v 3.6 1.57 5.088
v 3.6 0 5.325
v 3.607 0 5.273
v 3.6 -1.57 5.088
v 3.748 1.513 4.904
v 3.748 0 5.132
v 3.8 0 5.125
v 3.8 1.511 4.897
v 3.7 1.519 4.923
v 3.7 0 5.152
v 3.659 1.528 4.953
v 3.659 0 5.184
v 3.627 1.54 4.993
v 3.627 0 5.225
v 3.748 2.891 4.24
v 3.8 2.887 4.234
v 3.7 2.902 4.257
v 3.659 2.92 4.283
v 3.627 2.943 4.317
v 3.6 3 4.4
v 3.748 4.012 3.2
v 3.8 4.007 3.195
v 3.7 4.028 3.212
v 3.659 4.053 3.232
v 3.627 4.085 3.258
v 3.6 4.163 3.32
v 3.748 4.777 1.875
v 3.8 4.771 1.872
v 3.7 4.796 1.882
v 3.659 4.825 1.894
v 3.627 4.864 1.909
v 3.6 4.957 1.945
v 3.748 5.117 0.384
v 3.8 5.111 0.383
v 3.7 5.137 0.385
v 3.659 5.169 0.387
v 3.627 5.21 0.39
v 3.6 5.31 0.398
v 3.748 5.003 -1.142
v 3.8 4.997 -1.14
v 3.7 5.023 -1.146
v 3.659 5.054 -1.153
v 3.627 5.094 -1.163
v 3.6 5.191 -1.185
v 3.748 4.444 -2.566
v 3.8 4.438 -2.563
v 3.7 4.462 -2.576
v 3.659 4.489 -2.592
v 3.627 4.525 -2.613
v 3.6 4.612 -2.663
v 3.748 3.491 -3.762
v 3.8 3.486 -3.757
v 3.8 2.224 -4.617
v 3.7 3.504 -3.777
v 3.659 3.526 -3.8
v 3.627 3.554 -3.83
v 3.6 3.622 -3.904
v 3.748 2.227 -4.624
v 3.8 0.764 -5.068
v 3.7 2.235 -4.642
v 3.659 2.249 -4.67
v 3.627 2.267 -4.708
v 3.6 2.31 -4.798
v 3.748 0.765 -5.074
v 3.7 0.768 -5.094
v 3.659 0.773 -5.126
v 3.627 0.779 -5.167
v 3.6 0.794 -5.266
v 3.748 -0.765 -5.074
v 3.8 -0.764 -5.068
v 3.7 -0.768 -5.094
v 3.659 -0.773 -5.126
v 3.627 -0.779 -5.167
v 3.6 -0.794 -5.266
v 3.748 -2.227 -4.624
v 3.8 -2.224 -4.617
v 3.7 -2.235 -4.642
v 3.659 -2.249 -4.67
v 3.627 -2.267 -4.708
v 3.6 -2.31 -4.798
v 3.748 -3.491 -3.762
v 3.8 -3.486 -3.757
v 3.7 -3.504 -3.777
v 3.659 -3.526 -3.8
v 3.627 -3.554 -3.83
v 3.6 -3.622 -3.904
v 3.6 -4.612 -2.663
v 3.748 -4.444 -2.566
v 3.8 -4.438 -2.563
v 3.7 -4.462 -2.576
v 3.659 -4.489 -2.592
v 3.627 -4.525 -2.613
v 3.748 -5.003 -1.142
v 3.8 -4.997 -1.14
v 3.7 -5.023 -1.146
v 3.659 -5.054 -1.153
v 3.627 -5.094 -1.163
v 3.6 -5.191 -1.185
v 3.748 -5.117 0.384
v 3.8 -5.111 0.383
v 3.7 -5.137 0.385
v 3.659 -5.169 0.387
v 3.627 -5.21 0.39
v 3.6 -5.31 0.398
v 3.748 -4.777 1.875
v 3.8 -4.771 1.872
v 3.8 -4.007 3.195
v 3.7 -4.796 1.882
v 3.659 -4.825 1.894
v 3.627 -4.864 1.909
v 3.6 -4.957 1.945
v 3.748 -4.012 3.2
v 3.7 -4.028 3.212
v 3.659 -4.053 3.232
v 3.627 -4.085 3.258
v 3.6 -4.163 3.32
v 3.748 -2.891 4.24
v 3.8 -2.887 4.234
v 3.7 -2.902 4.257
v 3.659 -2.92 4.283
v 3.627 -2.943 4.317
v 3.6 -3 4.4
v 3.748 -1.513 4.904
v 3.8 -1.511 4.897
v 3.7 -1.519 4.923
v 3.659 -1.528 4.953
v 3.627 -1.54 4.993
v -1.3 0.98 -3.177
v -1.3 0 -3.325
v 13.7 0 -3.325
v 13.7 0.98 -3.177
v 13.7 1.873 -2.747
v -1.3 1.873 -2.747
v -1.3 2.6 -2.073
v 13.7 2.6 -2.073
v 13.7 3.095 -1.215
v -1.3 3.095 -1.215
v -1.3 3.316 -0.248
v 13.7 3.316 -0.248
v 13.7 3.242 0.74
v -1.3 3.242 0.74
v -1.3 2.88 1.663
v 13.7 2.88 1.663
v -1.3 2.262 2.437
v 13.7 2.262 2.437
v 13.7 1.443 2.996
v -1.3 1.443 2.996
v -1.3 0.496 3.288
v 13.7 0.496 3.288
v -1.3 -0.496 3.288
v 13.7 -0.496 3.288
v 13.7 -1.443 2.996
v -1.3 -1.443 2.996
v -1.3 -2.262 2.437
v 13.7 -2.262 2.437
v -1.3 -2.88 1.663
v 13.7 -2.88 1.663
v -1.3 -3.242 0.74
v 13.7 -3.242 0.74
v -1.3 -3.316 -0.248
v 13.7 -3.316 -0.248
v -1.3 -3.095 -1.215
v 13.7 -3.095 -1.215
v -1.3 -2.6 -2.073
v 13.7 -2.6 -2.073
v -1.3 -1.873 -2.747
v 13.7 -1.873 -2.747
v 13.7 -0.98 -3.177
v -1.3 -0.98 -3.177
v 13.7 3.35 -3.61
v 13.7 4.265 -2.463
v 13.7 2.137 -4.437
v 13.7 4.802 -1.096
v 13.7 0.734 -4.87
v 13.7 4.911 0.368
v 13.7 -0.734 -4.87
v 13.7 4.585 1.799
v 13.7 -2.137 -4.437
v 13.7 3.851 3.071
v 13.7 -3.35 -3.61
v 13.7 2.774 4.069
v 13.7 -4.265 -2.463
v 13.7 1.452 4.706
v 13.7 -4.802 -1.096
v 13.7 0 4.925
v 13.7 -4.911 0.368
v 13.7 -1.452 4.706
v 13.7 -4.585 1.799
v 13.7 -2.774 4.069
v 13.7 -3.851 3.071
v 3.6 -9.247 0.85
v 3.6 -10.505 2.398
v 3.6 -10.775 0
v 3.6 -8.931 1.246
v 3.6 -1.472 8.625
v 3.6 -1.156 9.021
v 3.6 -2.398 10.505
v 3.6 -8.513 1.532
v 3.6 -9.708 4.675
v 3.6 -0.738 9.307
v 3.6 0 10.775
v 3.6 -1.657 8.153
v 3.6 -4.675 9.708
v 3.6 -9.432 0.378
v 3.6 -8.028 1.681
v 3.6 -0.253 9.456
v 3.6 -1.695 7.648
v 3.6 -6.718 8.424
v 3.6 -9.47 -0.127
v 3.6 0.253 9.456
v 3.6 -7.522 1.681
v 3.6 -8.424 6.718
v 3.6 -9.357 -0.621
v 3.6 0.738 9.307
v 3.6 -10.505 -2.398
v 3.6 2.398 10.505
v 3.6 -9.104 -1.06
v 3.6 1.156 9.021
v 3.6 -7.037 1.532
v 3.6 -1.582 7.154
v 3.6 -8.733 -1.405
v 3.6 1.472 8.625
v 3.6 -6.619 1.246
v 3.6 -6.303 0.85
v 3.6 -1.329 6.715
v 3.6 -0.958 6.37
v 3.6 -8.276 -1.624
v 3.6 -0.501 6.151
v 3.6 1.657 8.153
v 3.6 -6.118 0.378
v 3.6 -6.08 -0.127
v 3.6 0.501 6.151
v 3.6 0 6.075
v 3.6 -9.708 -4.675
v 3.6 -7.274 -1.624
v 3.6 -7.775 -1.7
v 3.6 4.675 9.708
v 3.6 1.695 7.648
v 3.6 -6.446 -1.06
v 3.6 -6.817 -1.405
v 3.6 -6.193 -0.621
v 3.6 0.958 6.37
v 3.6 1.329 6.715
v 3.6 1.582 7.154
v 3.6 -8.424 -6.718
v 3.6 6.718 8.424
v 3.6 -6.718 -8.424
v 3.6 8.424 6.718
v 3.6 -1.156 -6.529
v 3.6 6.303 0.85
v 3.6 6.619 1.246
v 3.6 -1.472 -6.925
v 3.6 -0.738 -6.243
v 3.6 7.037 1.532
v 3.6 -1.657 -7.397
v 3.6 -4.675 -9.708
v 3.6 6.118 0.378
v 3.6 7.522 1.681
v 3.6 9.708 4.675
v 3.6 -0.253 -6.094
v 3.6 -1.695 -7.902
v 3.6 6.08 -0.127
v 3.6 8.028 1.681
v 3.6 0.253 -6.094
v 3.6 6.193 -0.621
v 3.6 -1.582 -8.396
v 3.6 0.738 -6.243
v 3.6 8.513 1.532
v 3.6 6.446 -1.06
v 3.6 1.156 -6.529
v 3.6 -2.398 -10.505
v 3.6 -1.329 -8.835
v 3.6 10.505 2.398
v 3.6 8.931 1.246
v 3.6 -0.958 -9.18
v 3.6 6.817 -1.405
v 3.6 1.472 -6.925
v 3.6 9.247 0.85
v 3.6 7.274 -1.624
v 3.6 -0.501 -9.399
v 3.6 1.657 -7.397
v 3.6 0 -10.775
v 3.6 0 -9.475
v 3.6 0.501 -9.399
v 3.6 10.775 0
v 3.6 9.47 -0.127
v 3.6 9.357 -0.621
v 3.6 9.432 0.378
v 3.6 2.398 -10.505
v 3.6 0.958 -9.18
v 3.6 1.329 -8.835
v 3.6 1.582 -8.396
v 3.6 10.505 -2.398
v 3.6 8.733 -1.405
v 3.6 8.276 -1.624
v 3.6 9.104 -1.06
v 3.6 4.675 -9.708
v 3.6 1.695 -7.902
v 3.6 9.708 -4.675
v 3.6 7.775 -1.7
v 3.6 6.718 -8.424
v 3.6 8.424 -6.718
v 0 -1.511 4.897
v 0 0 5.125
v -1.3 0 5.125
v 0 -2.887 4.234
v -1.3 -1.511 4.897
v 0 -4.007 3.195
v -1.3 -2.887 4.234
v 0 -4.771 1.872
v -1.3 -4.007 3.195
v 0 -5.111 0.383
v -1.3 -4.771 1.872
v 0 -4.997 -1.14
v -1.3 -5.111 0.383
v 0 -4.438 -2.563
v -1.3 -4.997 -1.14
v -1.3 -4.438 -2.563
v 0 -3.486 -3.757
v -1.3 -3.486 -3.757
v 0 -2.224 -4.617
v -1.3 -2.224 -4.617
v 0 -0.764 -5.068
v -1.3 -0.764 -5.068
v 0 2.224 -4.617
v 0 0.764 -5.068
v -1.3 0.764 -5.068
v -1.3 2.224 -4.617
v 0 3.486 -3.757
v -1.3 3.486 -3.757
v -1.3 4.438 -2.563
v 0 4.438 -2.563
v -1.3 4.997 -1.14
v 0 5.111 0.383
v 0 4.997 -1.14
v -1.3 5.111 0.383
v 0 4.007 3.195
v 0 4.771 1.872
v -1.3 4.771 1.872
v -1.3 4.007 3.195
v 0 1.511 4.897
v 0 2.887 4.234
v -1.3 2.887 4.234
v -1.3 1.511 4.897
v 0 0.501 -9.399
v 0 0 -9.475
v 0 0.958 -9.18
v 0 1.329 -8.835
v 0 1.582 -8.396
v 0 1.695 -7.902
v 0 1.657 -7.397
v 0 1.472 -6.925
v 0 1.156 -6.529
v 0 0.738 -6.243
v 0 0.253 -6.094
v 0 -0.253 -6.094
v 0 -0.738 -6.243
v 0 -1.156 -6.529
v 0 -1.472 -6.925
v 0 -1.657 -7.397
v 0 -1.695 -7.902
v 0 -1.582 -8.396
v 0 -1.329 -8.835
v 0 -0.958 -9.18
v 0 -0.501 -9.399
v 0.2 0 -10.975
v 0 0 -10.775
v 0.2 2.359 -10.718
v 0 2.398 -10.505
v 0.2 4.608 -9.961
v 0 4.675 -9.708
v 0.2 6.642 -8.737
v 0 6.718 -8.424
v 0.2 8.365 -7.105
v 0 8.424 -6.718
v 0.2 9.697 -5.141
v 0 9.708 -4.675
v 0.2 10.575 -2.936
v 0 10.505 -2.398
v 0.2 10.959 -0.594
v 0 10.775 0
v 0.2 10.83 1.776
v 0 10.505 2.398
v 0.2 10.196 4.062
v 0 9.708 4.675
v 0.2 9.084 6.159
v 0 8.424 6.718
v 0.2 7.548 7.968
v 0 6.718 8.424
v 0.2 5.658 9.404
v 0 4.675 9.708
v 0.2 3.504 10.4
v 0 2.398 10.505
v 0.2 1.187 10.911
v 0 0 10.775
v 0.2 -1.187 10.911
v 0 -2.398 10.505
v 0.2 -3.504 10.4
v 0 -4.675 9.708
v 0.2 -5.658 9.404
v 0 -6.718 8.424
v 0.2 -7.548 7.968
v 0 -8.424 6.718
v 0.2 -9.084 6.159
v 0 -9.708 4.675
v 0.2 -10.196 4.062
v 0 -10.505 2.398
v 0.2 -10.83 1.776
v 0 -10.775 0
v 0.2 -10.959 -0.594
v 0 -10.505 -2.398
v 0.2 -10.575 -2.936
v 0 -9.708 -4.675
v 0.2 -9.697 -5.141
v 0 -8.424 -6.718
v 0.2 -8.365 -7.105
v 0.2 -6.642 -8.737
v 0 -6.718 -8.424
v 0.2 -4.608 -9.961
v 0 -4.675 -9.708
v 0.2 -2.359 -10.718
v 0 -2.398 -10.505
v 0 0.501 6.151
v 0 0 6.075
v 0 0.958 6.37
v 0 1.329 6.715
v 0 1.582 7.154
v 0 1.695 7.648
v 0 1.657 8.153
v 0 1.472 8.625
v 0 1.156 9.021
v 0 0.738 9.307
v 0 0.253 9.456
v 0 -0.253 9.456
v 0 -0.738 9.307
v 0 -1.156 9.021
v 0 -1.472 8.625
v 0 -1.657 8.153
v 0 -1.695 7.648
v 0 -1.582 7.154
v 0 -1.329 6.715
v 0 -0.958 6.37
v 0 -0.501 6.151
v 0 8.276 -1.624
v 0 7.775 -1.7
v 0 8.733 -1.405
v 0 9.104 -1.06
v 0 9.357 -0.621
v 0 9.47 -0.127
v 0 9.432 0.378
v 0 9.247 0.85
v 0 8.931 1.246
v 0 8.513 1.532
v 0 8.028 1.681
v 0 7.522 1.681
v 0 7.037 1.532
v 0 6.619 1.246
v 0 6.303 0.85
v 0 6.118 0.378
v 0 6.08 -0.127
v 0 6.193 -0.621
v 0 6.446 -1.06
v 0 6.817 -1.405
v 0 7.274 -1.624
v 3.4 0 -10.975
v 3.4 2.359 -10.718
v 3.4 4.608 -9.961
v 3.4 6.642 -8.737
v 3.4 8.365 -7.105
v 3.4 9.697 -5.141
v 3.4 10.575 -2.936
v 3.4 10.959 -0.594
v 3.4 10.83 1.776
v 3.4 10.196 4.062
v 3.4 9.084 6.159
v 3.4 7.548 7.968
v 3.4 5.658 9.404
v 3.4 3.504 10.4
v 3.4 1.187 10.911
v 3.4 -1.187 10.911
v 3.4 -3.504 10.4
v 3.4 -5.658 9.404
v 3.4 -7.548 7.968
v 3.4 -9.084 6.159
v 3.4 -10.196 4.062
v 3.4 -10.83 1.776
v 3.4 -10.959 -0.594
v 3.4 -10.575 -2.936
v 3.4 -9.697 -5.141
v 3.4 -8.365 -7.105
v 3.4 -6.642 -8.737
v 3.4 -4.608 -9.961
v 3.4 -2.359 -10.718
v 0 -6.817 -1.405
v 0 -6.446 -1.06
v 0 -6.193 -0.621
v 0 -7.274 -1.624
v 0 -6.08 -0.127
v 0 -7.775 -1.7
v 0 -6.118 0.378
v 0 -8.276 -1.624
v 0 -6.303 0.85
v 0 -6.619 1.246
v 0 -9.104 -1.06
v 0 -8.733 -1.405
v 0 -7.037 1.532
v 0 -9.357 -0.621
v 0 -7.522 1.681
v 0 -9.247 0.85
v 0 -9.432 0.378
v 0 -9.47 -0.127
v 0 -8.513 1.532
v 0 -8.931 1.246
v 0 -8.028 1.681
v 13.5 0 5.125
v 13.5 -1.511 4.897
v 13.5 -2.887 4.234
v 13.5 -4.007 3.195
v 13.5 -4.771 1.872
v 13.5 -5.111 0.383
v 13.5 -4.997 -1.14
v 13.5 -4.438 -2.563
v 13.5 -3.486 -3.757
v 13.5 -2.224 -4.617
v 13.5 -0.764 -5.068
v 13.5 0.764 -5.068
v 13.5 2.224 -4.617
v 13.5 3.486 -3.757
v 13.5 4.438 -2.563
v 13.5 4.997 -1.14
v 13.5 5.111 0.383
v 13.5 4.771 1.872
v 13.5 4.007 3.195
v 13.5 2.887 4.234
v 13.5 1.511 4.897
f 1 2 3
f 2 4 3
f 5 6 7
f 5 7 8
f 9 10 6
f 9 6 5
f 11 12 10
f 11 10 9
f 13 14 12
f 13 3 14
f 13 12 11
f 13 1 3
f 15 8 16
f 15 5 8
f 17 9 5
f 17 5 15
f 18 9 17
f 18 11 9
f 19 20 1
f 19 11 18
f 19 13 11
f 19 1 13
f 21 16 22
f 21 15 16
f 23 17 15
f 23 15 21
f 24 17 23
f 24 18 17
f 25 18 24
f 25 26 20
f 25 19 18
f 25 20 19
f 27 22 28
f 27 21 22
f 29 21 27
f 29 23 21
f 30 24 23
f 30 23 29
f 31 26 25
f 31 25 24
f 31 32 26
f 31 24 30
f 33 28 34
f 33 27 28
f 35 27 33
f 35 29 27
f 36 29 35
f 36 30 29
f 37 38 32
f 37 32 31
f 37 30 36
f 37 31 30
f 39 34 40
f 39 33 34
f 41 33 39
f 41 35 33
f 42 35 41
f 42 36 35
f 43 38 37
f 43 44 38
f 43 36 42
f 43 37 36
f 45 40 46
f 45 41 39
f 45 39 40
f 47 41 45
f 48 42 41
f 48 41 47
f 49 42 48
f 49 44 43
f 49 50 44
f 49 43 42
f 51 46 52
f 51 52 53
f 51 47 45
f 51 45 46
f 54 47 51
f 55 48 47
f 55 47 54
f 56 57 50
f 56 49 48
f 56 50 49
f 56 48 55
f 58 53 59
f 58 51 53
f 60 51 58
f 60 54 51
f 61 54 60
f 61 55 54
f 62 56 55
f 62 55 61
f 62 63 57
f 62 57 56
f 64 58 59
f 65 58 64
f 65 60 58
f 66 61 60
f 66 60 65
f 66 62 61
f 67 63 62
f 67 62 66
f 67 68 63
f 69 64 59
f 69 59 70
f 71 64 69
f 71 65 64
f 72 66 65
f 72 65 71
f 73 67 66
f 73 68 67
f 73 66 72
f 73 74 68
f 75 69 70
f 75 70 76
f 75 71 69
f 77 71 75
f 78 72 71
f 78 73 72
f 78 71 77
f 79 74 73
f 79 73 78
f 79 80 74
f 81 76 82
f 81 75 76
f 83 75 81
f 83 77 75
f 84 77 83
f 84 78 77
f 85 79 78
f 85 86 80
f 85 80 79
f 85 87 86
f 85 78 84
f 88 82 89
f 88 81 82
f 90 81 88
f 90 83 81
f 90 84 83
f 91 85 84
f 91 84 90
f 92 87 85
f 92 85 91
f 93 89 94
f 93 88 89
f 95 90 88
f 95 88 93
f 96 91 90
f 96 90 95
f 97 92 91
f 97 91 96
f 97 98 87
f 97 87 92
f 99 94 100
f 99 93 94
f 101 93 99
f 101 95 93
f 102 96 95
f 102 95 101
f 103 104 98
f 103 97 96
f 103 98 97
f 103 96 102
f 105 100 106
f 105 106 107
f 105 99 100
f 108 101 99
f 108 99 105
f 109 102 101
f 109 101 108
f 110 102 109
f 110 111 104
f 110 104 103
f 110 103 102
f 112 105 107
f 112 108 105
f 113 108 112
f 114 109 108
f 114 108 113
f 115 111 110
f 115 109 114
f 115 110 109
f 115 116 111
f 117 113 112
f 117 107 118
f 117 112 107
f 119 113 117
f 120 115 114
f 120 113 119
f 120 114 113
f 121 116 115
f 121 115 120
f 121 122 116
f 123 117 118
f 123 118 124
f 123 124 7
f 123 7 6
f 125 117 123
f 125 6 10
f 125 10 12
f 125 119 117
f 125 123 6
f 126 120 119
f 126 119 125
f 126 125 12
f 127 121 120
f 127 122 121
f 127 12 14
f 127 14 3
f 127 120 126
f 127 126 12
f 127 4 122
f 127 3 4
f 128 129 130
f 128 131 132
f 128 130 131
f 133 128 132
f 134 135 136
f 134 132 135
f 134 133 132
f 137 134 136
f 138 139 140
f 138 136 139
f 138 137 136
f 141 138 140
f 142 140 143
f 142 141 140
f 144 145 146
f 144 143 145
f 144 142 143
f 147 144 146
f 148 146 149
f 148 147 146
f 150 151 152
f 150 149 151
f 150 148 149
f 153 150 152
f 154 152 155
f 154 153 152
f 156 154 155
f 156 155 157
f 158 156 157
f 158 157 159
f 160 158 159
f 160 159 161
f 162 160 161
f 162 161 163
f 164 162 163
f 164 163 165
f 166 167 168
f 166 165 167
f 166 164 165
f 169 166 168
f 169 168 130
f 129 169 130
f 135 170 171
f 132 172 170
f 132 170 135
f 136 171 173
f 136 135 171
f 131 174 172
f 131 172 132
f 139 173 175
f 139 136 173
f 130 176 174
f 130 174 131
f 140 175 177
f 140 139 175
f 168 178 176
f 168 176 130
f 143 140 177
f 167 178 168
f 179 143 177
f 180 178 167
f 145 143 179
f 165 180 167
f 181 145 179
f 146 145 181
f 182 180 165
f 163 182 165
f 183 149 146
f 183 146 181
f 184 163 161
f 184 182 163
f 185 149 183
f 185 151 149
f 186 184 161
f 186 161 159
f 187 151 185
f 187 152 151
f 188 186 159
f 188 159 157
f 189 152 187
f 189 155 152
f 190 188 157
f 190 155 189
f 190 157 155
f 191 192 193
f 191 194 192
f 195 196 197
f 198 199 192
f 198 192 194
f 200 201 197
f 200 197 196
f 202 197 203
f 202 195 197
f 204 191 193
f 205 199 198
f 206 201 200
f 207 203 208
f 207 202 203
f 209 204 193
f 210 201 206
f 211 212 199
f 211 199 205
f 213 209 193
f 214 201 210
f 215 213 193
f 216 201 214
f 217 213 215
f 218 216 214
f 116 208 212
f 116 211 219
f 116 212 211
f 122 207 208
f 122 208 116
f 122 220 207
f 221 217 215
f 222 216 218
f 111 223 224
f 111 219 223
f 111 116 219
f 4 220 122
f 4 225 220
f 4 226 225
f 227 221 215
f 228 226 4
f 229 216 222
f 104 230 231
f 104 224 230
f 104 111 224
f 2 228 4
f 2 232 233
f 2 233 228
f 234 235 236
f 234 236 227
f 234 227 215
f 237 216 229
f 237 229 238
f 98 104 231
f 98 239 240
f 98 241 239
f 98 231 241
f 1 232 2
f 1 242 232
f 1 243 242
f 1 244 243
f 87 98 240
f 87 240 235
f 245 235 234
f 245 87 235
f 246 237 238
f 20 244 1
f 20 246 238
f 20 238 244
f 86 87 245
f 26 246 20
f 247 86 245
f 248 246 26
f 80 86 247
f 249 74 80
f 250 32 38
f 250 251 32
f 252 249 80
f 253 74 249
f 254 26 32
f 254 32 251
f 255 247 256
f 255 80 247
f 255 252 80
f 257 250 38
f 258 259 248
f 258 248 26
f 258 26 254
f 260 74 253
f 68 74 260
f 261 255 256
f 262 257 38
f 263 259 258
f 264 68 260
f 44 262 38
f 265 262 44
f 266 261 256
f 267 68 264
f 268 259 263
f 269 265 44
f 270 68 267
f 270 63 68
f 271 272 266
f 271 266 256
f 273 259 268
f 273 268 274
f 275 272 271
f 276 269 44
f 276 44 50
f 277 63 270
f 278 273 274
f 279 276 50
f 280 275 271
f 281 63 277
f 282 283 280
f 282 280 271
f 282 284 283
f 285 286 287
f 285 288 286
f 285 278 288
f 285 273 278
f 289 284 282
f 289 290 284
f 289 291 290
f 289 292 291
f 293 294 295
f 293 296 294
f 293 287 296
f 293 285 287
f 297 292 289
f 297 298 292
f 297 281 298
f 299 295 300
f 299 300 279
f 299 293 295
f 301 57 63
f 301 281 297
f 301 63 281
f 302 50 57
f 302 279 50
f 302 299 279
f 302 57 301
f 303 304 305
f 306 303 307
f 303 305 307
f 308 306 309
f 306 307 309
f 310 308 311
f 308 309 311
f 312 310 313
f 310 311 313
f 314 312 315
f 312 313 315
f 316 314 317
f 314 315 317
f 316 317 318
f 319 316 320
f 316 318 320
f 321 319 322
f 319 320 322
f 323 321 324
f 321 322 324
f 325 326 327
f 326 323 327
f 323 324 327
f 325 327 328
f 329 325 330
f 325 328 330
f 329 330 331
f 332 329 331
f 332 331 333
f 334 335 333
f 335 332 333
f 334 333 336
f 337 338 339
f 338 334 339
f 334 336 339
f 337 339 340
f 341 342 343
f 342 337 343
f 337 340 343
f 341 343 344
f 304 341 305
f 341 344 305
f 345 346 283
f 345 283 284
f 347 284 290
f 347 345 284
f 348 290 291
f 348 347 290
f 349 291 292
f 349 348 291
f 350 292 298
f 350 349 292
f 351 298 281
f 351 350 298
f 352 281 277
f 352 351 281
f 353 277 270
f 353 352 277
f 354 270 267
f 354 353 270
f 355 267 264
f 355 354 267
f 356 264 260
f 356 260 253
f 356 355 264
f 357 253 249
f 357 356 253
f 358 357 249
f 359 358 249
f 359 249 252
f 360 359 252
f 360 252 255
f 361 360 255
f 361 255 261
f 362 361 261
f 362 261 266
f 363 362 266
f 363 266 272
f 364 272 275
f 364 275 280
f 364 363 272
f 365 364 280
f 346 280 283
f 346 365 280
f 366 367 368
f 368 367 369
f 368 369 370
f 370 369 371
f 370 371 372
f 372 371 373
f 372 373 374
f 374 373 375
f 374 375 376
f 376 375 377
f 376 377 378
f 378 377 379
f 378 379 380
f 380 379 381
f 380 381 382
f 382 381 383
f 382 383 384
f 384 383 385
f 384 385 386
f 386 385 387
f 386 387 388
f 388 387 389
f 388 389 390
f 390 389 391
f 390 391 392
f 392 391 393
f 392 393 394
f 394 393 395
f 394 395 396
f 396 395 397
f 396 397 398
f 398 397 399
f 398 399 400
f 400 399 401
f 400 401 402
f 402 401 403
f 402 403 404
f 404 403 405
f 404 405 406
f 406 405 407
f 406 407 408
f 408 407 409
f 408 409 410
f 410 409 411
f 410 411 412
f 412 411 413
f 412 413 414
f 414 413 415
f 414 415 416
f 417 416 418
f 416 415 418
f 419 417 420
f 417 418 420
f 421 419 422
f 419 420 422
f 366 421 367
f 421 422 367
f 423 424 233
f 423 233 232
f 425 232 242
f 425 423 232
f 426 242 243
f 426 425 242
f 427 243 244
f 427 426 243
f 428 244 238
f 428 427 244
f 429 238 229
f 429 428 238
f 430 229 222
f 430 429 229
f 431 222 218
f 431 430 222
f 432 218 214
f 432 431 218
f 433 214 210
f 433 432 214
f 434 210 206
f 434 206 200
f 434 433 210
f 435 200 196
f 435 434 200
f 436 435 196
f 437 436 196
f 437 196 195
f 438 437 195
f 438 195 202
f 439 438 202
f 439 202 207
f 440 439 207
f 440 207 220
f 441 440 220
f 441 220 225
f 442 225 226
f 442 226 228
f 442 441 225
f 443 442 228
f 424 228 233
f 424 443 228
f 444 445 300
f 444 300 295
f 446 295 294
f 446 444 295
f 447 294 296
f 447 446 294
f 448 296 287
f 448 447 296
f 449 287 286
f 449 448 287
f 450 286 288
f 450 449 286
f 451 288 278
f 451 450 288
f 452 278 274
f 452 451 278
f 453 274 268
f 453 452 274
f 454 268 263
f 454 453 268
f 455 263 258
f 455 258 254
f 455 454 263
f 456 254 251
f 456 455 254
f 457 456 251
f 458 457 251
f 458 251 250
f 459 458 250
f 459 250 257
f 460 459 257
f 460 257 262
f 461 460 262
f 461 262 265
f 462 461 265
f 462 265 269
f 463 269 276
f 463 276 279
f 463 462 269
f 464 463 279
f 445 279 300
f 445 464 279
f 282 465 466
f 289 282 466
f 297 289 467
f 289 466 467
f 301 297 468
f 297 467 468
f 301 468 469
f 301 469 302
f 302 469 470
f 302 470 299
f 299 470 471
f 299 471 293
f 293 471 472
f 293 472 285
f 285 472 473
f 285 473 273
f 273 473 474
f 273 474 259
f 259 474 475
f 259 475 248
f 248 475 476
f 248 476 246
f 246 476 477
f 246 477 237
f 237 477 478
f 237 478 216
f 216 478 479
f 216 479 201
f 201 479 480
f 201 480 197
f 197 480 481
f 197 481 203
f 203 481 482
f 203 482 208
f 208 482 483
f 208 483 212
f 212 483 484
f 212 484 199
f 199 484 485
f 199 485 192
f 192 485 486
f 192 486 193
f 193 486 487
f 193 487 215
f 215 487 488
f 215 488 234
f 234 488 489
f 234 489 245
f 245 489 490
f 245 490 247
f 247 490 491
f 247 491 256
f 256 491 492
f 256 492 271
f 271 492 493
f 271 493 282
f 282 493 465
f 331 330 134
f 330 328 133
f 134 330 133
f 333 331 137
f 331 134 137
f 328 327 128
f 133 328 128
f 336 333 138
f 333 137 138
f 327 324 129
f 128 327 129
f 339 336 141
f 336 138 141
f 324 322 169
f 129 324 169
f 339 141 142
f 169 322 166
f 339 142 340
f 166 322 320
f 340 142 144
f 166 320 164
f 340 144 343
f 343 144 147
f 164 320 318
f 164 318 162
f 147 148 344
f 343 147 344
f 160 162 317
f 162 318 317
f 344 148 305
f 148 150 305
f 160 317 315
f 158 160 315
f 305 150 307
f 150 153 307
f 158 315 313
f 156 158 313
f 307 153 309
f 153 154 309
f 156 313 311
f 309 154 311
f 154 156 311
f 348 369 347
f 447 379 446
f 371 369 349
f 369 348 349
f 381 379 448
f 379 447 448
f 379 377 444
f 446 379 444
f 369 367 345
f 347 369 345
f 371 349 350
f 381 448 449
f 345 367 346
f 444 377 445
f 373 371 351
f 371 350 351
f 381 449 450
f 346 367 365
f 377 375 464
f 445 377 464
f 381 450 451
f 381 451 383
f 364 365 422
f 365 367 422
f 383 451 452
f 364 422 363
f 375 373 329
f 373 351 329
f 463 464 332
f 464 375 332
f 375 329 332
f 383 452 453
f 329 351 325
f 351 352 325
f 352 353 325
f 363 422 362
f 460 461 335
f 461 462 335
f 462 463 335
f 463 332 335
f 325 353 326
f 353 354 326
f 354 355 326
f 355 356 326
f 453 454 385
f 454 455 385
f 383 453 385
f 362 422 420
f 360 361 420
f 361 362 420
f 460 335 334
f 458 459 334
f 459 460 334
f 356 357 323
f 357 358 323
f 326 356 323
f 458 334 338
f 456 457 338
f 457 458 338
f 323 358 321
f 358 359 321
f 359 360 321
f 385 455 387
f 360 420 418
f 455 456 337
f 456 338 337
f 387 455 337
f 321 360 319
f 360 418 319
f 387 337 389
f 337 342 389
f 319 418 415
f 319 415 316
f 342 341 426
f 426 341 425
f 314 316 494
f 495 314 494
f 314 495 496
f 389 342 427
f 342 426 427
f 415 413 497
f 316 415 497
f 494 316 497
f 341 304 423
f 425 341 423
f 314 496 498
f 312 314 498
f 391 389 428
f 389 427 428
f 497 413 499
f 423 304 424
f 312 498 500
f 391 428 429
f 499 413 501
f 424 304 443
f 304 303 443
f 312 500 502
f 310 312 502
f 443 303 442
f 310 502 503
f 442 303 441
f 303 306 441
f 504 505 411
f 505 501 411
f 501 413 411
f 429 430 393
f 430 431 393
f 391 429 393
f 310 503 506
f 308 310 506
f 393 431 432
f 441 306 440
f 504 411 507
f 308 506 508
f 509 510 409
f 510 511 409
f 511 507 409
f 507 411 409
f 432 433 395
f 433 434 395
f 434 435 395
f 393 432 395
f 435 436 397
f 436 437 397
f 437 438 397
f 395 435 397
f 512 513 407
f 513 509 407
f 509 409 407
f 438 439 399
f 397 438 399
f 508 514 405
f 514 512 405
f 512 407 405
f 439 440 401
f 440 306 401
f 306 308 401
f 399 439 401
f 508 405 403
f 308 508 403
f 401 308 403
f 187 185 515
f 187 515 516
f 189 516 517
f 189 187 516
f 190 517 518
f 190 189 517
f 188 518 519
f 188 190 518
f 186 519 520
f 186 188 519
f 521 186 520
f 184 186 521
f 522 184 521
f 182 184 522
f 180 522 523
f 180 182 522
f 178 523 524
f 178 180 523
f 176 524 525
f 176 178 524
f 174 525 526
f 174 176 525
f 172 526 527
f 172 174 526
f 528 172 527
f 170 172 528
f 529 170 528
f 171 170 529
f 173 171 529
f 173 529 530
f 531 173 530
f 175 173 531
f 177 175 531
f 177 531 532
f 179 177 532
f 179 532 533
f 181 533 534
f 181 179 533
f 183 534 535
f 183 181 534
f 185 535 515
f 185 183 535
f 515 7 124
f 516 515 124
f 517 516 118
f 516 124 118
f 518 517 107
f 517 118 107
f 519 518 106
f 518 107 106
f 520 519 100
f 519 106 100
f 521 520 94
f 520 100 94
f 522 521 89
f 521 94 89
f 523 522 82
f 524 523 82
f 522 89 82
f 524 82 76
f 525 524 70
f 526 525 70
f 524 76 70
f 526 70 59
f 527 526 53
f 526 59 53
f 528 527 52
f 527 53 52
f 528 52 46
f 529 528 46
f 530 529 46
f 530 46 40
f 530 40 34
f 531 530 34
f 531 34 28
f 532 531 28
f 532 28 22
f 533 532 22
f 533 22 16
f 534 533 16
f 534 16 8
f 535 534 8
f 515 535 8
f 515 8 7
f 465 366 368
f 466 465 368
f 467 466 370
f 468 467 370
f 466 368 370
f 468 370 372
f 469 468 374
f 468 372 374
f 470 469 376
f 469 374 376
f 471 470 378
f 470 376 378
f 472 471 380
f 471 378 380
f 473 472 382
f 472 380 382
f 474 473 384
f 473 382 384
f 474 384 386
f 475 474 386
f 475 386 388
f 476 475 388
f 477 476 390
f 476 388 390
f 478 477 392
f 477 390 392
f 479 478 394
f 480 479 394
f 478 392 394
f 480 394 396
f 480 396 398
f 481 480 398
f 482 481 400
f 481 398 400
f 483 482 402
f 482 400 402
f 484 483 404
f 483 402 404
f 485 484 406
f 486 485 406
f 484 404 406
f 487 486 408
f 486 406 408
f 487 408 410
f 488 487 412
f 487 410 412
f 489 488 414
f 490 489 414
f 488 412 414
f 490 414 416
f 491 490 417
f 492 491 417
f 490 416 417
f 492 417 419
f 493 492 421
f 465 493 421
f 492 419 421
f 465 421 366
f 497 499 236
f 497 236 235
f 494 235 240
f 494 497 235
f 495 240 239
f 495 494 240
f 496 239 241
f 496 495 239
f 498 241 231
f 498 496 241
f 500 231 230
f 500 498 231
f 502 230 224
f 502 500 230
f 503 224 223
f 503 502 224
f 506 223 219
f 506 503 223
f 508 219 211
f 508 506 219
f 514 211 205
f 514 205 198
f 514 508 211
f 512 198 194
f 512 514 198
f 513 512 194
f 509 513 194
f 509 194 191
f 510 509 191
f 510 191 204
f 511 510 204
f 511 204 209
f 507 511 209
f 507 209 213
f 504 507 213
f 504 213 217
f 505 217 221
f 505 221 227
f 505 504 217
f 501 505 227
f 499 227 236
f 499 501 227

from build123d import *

# Parameters (mm, degrees)
SKETCH1_R                = 10.975
SKETCH1_R_2              = 1.7
BOSS_EXTRUDE1_DEPTH      = 3.6
SKETCH2_R                = 5.125
BOSS_EXTRUDE2_DEPTH      = 13.7
BOSS_EXTRUDE3_DEPTH      = 13.7
BOSS_EXTRUDE3_DEPTH_BACK = 1.3
SKETCH2_2_R              = 5.125
CUT_EXTRUDE1_DEPTH       = 21.702445508
CUT_EXTRUDE1_DEPTH_BACK  = 21.702445508
SKETCH3_R                = 3.325
FILLET1_R                = 0.2
CHAMFER1_SIZE            = 0.2


with BuildPart() as part:
    # Sketch1 → Boss-Extrude1 (new body)
    with BuildSketch(Plane(origin=(0, 0, 0), x_dir=(0, 0, -1), z_dir=(1, 0, 0))):
        Circle(SKETCH1_R)
        with Locations((0, 7.775)):
            Circle(SKETCH1_R_2, mode=Mode.SUBTRACT)
        with Locations((7.775, 0)):
            Circle(SKETCH1_R_2, mode=Mode.SUBTRACT)
        with Locations((0, -7.775)):
            Circle(SKETCH1_R_2, mode=Mode.SUBTRACT)
        with Locations((-7.775, 0)):
            Circle(SKETCH1_R_2, mode=Mode.SUBTRACT)
    extrude(amount=BOSS_EXTRUDE1_DEPTH)

    # Sketch2 → Boss-Extrude2 (add)
    with BuildSketch(Plane(origin=(0, 0, 0), x_dir=(0, 0, -1), z_dir=(1, 0, 0))):
        Circle(SKETCH2_R)
    extrude(amount=BOSS_EXTRUDE2_DEPTH)

    # Sketch2<2> → Boss-Extrude3 (add, two sides: drawn at the far end of the back side and taken through both)
    with BuildSketch(Plane(origin=(0, 0, 0), x_dir=(0, 0, -1), z_dir=(1, 0, 0)).offset(-BOSS_EXTRUDE3_DEPTH_BACK)):
        Circle(SKETCH2_2_R)
    extrude(amount=BOSS_EXTRUDE3_DEPTH + BOSS_EXTRUDE3_DEPTH_BACK)

    # Sketch3 → Cut-Extrude1 (cut, two sides: drawn at the far end of the back side and taken through both)
    with BuildSketch(Plane(origin=(0, 0, 0), x_dir=(0, 0, -1), z_dir=(1, 0, 0)).offset(-CUT_EXTRUDE1_DEPTH_BACK)):
        Circle(SKETCH3_R)
    extrude(amount=CUT_EXTRUDE1_DEPTH + CUT_EXTRUDE1_DEPTH_BACK, mode=Mode.SUBTRACT)

    # Fillet1
    fillet1_edges = [part.edges().sort_by_distance(p)[0] for p in [
        (3.6, 0, 5.125),
    ]]
    fillet(fillet1_edges, radius=FILLET1_R)

    # Chamfer1
    chamfer1_edges = [part.edges().sort_by_distance(p)[0] for p in [
        (13.7, 0, 5.125),
        (0, 0, 10.975),
        (3.6, 0, 10.975),
    ]]
    chamfer(chamfer1_edges, length=CHAMFER1_SIZE)


solid = part.part
